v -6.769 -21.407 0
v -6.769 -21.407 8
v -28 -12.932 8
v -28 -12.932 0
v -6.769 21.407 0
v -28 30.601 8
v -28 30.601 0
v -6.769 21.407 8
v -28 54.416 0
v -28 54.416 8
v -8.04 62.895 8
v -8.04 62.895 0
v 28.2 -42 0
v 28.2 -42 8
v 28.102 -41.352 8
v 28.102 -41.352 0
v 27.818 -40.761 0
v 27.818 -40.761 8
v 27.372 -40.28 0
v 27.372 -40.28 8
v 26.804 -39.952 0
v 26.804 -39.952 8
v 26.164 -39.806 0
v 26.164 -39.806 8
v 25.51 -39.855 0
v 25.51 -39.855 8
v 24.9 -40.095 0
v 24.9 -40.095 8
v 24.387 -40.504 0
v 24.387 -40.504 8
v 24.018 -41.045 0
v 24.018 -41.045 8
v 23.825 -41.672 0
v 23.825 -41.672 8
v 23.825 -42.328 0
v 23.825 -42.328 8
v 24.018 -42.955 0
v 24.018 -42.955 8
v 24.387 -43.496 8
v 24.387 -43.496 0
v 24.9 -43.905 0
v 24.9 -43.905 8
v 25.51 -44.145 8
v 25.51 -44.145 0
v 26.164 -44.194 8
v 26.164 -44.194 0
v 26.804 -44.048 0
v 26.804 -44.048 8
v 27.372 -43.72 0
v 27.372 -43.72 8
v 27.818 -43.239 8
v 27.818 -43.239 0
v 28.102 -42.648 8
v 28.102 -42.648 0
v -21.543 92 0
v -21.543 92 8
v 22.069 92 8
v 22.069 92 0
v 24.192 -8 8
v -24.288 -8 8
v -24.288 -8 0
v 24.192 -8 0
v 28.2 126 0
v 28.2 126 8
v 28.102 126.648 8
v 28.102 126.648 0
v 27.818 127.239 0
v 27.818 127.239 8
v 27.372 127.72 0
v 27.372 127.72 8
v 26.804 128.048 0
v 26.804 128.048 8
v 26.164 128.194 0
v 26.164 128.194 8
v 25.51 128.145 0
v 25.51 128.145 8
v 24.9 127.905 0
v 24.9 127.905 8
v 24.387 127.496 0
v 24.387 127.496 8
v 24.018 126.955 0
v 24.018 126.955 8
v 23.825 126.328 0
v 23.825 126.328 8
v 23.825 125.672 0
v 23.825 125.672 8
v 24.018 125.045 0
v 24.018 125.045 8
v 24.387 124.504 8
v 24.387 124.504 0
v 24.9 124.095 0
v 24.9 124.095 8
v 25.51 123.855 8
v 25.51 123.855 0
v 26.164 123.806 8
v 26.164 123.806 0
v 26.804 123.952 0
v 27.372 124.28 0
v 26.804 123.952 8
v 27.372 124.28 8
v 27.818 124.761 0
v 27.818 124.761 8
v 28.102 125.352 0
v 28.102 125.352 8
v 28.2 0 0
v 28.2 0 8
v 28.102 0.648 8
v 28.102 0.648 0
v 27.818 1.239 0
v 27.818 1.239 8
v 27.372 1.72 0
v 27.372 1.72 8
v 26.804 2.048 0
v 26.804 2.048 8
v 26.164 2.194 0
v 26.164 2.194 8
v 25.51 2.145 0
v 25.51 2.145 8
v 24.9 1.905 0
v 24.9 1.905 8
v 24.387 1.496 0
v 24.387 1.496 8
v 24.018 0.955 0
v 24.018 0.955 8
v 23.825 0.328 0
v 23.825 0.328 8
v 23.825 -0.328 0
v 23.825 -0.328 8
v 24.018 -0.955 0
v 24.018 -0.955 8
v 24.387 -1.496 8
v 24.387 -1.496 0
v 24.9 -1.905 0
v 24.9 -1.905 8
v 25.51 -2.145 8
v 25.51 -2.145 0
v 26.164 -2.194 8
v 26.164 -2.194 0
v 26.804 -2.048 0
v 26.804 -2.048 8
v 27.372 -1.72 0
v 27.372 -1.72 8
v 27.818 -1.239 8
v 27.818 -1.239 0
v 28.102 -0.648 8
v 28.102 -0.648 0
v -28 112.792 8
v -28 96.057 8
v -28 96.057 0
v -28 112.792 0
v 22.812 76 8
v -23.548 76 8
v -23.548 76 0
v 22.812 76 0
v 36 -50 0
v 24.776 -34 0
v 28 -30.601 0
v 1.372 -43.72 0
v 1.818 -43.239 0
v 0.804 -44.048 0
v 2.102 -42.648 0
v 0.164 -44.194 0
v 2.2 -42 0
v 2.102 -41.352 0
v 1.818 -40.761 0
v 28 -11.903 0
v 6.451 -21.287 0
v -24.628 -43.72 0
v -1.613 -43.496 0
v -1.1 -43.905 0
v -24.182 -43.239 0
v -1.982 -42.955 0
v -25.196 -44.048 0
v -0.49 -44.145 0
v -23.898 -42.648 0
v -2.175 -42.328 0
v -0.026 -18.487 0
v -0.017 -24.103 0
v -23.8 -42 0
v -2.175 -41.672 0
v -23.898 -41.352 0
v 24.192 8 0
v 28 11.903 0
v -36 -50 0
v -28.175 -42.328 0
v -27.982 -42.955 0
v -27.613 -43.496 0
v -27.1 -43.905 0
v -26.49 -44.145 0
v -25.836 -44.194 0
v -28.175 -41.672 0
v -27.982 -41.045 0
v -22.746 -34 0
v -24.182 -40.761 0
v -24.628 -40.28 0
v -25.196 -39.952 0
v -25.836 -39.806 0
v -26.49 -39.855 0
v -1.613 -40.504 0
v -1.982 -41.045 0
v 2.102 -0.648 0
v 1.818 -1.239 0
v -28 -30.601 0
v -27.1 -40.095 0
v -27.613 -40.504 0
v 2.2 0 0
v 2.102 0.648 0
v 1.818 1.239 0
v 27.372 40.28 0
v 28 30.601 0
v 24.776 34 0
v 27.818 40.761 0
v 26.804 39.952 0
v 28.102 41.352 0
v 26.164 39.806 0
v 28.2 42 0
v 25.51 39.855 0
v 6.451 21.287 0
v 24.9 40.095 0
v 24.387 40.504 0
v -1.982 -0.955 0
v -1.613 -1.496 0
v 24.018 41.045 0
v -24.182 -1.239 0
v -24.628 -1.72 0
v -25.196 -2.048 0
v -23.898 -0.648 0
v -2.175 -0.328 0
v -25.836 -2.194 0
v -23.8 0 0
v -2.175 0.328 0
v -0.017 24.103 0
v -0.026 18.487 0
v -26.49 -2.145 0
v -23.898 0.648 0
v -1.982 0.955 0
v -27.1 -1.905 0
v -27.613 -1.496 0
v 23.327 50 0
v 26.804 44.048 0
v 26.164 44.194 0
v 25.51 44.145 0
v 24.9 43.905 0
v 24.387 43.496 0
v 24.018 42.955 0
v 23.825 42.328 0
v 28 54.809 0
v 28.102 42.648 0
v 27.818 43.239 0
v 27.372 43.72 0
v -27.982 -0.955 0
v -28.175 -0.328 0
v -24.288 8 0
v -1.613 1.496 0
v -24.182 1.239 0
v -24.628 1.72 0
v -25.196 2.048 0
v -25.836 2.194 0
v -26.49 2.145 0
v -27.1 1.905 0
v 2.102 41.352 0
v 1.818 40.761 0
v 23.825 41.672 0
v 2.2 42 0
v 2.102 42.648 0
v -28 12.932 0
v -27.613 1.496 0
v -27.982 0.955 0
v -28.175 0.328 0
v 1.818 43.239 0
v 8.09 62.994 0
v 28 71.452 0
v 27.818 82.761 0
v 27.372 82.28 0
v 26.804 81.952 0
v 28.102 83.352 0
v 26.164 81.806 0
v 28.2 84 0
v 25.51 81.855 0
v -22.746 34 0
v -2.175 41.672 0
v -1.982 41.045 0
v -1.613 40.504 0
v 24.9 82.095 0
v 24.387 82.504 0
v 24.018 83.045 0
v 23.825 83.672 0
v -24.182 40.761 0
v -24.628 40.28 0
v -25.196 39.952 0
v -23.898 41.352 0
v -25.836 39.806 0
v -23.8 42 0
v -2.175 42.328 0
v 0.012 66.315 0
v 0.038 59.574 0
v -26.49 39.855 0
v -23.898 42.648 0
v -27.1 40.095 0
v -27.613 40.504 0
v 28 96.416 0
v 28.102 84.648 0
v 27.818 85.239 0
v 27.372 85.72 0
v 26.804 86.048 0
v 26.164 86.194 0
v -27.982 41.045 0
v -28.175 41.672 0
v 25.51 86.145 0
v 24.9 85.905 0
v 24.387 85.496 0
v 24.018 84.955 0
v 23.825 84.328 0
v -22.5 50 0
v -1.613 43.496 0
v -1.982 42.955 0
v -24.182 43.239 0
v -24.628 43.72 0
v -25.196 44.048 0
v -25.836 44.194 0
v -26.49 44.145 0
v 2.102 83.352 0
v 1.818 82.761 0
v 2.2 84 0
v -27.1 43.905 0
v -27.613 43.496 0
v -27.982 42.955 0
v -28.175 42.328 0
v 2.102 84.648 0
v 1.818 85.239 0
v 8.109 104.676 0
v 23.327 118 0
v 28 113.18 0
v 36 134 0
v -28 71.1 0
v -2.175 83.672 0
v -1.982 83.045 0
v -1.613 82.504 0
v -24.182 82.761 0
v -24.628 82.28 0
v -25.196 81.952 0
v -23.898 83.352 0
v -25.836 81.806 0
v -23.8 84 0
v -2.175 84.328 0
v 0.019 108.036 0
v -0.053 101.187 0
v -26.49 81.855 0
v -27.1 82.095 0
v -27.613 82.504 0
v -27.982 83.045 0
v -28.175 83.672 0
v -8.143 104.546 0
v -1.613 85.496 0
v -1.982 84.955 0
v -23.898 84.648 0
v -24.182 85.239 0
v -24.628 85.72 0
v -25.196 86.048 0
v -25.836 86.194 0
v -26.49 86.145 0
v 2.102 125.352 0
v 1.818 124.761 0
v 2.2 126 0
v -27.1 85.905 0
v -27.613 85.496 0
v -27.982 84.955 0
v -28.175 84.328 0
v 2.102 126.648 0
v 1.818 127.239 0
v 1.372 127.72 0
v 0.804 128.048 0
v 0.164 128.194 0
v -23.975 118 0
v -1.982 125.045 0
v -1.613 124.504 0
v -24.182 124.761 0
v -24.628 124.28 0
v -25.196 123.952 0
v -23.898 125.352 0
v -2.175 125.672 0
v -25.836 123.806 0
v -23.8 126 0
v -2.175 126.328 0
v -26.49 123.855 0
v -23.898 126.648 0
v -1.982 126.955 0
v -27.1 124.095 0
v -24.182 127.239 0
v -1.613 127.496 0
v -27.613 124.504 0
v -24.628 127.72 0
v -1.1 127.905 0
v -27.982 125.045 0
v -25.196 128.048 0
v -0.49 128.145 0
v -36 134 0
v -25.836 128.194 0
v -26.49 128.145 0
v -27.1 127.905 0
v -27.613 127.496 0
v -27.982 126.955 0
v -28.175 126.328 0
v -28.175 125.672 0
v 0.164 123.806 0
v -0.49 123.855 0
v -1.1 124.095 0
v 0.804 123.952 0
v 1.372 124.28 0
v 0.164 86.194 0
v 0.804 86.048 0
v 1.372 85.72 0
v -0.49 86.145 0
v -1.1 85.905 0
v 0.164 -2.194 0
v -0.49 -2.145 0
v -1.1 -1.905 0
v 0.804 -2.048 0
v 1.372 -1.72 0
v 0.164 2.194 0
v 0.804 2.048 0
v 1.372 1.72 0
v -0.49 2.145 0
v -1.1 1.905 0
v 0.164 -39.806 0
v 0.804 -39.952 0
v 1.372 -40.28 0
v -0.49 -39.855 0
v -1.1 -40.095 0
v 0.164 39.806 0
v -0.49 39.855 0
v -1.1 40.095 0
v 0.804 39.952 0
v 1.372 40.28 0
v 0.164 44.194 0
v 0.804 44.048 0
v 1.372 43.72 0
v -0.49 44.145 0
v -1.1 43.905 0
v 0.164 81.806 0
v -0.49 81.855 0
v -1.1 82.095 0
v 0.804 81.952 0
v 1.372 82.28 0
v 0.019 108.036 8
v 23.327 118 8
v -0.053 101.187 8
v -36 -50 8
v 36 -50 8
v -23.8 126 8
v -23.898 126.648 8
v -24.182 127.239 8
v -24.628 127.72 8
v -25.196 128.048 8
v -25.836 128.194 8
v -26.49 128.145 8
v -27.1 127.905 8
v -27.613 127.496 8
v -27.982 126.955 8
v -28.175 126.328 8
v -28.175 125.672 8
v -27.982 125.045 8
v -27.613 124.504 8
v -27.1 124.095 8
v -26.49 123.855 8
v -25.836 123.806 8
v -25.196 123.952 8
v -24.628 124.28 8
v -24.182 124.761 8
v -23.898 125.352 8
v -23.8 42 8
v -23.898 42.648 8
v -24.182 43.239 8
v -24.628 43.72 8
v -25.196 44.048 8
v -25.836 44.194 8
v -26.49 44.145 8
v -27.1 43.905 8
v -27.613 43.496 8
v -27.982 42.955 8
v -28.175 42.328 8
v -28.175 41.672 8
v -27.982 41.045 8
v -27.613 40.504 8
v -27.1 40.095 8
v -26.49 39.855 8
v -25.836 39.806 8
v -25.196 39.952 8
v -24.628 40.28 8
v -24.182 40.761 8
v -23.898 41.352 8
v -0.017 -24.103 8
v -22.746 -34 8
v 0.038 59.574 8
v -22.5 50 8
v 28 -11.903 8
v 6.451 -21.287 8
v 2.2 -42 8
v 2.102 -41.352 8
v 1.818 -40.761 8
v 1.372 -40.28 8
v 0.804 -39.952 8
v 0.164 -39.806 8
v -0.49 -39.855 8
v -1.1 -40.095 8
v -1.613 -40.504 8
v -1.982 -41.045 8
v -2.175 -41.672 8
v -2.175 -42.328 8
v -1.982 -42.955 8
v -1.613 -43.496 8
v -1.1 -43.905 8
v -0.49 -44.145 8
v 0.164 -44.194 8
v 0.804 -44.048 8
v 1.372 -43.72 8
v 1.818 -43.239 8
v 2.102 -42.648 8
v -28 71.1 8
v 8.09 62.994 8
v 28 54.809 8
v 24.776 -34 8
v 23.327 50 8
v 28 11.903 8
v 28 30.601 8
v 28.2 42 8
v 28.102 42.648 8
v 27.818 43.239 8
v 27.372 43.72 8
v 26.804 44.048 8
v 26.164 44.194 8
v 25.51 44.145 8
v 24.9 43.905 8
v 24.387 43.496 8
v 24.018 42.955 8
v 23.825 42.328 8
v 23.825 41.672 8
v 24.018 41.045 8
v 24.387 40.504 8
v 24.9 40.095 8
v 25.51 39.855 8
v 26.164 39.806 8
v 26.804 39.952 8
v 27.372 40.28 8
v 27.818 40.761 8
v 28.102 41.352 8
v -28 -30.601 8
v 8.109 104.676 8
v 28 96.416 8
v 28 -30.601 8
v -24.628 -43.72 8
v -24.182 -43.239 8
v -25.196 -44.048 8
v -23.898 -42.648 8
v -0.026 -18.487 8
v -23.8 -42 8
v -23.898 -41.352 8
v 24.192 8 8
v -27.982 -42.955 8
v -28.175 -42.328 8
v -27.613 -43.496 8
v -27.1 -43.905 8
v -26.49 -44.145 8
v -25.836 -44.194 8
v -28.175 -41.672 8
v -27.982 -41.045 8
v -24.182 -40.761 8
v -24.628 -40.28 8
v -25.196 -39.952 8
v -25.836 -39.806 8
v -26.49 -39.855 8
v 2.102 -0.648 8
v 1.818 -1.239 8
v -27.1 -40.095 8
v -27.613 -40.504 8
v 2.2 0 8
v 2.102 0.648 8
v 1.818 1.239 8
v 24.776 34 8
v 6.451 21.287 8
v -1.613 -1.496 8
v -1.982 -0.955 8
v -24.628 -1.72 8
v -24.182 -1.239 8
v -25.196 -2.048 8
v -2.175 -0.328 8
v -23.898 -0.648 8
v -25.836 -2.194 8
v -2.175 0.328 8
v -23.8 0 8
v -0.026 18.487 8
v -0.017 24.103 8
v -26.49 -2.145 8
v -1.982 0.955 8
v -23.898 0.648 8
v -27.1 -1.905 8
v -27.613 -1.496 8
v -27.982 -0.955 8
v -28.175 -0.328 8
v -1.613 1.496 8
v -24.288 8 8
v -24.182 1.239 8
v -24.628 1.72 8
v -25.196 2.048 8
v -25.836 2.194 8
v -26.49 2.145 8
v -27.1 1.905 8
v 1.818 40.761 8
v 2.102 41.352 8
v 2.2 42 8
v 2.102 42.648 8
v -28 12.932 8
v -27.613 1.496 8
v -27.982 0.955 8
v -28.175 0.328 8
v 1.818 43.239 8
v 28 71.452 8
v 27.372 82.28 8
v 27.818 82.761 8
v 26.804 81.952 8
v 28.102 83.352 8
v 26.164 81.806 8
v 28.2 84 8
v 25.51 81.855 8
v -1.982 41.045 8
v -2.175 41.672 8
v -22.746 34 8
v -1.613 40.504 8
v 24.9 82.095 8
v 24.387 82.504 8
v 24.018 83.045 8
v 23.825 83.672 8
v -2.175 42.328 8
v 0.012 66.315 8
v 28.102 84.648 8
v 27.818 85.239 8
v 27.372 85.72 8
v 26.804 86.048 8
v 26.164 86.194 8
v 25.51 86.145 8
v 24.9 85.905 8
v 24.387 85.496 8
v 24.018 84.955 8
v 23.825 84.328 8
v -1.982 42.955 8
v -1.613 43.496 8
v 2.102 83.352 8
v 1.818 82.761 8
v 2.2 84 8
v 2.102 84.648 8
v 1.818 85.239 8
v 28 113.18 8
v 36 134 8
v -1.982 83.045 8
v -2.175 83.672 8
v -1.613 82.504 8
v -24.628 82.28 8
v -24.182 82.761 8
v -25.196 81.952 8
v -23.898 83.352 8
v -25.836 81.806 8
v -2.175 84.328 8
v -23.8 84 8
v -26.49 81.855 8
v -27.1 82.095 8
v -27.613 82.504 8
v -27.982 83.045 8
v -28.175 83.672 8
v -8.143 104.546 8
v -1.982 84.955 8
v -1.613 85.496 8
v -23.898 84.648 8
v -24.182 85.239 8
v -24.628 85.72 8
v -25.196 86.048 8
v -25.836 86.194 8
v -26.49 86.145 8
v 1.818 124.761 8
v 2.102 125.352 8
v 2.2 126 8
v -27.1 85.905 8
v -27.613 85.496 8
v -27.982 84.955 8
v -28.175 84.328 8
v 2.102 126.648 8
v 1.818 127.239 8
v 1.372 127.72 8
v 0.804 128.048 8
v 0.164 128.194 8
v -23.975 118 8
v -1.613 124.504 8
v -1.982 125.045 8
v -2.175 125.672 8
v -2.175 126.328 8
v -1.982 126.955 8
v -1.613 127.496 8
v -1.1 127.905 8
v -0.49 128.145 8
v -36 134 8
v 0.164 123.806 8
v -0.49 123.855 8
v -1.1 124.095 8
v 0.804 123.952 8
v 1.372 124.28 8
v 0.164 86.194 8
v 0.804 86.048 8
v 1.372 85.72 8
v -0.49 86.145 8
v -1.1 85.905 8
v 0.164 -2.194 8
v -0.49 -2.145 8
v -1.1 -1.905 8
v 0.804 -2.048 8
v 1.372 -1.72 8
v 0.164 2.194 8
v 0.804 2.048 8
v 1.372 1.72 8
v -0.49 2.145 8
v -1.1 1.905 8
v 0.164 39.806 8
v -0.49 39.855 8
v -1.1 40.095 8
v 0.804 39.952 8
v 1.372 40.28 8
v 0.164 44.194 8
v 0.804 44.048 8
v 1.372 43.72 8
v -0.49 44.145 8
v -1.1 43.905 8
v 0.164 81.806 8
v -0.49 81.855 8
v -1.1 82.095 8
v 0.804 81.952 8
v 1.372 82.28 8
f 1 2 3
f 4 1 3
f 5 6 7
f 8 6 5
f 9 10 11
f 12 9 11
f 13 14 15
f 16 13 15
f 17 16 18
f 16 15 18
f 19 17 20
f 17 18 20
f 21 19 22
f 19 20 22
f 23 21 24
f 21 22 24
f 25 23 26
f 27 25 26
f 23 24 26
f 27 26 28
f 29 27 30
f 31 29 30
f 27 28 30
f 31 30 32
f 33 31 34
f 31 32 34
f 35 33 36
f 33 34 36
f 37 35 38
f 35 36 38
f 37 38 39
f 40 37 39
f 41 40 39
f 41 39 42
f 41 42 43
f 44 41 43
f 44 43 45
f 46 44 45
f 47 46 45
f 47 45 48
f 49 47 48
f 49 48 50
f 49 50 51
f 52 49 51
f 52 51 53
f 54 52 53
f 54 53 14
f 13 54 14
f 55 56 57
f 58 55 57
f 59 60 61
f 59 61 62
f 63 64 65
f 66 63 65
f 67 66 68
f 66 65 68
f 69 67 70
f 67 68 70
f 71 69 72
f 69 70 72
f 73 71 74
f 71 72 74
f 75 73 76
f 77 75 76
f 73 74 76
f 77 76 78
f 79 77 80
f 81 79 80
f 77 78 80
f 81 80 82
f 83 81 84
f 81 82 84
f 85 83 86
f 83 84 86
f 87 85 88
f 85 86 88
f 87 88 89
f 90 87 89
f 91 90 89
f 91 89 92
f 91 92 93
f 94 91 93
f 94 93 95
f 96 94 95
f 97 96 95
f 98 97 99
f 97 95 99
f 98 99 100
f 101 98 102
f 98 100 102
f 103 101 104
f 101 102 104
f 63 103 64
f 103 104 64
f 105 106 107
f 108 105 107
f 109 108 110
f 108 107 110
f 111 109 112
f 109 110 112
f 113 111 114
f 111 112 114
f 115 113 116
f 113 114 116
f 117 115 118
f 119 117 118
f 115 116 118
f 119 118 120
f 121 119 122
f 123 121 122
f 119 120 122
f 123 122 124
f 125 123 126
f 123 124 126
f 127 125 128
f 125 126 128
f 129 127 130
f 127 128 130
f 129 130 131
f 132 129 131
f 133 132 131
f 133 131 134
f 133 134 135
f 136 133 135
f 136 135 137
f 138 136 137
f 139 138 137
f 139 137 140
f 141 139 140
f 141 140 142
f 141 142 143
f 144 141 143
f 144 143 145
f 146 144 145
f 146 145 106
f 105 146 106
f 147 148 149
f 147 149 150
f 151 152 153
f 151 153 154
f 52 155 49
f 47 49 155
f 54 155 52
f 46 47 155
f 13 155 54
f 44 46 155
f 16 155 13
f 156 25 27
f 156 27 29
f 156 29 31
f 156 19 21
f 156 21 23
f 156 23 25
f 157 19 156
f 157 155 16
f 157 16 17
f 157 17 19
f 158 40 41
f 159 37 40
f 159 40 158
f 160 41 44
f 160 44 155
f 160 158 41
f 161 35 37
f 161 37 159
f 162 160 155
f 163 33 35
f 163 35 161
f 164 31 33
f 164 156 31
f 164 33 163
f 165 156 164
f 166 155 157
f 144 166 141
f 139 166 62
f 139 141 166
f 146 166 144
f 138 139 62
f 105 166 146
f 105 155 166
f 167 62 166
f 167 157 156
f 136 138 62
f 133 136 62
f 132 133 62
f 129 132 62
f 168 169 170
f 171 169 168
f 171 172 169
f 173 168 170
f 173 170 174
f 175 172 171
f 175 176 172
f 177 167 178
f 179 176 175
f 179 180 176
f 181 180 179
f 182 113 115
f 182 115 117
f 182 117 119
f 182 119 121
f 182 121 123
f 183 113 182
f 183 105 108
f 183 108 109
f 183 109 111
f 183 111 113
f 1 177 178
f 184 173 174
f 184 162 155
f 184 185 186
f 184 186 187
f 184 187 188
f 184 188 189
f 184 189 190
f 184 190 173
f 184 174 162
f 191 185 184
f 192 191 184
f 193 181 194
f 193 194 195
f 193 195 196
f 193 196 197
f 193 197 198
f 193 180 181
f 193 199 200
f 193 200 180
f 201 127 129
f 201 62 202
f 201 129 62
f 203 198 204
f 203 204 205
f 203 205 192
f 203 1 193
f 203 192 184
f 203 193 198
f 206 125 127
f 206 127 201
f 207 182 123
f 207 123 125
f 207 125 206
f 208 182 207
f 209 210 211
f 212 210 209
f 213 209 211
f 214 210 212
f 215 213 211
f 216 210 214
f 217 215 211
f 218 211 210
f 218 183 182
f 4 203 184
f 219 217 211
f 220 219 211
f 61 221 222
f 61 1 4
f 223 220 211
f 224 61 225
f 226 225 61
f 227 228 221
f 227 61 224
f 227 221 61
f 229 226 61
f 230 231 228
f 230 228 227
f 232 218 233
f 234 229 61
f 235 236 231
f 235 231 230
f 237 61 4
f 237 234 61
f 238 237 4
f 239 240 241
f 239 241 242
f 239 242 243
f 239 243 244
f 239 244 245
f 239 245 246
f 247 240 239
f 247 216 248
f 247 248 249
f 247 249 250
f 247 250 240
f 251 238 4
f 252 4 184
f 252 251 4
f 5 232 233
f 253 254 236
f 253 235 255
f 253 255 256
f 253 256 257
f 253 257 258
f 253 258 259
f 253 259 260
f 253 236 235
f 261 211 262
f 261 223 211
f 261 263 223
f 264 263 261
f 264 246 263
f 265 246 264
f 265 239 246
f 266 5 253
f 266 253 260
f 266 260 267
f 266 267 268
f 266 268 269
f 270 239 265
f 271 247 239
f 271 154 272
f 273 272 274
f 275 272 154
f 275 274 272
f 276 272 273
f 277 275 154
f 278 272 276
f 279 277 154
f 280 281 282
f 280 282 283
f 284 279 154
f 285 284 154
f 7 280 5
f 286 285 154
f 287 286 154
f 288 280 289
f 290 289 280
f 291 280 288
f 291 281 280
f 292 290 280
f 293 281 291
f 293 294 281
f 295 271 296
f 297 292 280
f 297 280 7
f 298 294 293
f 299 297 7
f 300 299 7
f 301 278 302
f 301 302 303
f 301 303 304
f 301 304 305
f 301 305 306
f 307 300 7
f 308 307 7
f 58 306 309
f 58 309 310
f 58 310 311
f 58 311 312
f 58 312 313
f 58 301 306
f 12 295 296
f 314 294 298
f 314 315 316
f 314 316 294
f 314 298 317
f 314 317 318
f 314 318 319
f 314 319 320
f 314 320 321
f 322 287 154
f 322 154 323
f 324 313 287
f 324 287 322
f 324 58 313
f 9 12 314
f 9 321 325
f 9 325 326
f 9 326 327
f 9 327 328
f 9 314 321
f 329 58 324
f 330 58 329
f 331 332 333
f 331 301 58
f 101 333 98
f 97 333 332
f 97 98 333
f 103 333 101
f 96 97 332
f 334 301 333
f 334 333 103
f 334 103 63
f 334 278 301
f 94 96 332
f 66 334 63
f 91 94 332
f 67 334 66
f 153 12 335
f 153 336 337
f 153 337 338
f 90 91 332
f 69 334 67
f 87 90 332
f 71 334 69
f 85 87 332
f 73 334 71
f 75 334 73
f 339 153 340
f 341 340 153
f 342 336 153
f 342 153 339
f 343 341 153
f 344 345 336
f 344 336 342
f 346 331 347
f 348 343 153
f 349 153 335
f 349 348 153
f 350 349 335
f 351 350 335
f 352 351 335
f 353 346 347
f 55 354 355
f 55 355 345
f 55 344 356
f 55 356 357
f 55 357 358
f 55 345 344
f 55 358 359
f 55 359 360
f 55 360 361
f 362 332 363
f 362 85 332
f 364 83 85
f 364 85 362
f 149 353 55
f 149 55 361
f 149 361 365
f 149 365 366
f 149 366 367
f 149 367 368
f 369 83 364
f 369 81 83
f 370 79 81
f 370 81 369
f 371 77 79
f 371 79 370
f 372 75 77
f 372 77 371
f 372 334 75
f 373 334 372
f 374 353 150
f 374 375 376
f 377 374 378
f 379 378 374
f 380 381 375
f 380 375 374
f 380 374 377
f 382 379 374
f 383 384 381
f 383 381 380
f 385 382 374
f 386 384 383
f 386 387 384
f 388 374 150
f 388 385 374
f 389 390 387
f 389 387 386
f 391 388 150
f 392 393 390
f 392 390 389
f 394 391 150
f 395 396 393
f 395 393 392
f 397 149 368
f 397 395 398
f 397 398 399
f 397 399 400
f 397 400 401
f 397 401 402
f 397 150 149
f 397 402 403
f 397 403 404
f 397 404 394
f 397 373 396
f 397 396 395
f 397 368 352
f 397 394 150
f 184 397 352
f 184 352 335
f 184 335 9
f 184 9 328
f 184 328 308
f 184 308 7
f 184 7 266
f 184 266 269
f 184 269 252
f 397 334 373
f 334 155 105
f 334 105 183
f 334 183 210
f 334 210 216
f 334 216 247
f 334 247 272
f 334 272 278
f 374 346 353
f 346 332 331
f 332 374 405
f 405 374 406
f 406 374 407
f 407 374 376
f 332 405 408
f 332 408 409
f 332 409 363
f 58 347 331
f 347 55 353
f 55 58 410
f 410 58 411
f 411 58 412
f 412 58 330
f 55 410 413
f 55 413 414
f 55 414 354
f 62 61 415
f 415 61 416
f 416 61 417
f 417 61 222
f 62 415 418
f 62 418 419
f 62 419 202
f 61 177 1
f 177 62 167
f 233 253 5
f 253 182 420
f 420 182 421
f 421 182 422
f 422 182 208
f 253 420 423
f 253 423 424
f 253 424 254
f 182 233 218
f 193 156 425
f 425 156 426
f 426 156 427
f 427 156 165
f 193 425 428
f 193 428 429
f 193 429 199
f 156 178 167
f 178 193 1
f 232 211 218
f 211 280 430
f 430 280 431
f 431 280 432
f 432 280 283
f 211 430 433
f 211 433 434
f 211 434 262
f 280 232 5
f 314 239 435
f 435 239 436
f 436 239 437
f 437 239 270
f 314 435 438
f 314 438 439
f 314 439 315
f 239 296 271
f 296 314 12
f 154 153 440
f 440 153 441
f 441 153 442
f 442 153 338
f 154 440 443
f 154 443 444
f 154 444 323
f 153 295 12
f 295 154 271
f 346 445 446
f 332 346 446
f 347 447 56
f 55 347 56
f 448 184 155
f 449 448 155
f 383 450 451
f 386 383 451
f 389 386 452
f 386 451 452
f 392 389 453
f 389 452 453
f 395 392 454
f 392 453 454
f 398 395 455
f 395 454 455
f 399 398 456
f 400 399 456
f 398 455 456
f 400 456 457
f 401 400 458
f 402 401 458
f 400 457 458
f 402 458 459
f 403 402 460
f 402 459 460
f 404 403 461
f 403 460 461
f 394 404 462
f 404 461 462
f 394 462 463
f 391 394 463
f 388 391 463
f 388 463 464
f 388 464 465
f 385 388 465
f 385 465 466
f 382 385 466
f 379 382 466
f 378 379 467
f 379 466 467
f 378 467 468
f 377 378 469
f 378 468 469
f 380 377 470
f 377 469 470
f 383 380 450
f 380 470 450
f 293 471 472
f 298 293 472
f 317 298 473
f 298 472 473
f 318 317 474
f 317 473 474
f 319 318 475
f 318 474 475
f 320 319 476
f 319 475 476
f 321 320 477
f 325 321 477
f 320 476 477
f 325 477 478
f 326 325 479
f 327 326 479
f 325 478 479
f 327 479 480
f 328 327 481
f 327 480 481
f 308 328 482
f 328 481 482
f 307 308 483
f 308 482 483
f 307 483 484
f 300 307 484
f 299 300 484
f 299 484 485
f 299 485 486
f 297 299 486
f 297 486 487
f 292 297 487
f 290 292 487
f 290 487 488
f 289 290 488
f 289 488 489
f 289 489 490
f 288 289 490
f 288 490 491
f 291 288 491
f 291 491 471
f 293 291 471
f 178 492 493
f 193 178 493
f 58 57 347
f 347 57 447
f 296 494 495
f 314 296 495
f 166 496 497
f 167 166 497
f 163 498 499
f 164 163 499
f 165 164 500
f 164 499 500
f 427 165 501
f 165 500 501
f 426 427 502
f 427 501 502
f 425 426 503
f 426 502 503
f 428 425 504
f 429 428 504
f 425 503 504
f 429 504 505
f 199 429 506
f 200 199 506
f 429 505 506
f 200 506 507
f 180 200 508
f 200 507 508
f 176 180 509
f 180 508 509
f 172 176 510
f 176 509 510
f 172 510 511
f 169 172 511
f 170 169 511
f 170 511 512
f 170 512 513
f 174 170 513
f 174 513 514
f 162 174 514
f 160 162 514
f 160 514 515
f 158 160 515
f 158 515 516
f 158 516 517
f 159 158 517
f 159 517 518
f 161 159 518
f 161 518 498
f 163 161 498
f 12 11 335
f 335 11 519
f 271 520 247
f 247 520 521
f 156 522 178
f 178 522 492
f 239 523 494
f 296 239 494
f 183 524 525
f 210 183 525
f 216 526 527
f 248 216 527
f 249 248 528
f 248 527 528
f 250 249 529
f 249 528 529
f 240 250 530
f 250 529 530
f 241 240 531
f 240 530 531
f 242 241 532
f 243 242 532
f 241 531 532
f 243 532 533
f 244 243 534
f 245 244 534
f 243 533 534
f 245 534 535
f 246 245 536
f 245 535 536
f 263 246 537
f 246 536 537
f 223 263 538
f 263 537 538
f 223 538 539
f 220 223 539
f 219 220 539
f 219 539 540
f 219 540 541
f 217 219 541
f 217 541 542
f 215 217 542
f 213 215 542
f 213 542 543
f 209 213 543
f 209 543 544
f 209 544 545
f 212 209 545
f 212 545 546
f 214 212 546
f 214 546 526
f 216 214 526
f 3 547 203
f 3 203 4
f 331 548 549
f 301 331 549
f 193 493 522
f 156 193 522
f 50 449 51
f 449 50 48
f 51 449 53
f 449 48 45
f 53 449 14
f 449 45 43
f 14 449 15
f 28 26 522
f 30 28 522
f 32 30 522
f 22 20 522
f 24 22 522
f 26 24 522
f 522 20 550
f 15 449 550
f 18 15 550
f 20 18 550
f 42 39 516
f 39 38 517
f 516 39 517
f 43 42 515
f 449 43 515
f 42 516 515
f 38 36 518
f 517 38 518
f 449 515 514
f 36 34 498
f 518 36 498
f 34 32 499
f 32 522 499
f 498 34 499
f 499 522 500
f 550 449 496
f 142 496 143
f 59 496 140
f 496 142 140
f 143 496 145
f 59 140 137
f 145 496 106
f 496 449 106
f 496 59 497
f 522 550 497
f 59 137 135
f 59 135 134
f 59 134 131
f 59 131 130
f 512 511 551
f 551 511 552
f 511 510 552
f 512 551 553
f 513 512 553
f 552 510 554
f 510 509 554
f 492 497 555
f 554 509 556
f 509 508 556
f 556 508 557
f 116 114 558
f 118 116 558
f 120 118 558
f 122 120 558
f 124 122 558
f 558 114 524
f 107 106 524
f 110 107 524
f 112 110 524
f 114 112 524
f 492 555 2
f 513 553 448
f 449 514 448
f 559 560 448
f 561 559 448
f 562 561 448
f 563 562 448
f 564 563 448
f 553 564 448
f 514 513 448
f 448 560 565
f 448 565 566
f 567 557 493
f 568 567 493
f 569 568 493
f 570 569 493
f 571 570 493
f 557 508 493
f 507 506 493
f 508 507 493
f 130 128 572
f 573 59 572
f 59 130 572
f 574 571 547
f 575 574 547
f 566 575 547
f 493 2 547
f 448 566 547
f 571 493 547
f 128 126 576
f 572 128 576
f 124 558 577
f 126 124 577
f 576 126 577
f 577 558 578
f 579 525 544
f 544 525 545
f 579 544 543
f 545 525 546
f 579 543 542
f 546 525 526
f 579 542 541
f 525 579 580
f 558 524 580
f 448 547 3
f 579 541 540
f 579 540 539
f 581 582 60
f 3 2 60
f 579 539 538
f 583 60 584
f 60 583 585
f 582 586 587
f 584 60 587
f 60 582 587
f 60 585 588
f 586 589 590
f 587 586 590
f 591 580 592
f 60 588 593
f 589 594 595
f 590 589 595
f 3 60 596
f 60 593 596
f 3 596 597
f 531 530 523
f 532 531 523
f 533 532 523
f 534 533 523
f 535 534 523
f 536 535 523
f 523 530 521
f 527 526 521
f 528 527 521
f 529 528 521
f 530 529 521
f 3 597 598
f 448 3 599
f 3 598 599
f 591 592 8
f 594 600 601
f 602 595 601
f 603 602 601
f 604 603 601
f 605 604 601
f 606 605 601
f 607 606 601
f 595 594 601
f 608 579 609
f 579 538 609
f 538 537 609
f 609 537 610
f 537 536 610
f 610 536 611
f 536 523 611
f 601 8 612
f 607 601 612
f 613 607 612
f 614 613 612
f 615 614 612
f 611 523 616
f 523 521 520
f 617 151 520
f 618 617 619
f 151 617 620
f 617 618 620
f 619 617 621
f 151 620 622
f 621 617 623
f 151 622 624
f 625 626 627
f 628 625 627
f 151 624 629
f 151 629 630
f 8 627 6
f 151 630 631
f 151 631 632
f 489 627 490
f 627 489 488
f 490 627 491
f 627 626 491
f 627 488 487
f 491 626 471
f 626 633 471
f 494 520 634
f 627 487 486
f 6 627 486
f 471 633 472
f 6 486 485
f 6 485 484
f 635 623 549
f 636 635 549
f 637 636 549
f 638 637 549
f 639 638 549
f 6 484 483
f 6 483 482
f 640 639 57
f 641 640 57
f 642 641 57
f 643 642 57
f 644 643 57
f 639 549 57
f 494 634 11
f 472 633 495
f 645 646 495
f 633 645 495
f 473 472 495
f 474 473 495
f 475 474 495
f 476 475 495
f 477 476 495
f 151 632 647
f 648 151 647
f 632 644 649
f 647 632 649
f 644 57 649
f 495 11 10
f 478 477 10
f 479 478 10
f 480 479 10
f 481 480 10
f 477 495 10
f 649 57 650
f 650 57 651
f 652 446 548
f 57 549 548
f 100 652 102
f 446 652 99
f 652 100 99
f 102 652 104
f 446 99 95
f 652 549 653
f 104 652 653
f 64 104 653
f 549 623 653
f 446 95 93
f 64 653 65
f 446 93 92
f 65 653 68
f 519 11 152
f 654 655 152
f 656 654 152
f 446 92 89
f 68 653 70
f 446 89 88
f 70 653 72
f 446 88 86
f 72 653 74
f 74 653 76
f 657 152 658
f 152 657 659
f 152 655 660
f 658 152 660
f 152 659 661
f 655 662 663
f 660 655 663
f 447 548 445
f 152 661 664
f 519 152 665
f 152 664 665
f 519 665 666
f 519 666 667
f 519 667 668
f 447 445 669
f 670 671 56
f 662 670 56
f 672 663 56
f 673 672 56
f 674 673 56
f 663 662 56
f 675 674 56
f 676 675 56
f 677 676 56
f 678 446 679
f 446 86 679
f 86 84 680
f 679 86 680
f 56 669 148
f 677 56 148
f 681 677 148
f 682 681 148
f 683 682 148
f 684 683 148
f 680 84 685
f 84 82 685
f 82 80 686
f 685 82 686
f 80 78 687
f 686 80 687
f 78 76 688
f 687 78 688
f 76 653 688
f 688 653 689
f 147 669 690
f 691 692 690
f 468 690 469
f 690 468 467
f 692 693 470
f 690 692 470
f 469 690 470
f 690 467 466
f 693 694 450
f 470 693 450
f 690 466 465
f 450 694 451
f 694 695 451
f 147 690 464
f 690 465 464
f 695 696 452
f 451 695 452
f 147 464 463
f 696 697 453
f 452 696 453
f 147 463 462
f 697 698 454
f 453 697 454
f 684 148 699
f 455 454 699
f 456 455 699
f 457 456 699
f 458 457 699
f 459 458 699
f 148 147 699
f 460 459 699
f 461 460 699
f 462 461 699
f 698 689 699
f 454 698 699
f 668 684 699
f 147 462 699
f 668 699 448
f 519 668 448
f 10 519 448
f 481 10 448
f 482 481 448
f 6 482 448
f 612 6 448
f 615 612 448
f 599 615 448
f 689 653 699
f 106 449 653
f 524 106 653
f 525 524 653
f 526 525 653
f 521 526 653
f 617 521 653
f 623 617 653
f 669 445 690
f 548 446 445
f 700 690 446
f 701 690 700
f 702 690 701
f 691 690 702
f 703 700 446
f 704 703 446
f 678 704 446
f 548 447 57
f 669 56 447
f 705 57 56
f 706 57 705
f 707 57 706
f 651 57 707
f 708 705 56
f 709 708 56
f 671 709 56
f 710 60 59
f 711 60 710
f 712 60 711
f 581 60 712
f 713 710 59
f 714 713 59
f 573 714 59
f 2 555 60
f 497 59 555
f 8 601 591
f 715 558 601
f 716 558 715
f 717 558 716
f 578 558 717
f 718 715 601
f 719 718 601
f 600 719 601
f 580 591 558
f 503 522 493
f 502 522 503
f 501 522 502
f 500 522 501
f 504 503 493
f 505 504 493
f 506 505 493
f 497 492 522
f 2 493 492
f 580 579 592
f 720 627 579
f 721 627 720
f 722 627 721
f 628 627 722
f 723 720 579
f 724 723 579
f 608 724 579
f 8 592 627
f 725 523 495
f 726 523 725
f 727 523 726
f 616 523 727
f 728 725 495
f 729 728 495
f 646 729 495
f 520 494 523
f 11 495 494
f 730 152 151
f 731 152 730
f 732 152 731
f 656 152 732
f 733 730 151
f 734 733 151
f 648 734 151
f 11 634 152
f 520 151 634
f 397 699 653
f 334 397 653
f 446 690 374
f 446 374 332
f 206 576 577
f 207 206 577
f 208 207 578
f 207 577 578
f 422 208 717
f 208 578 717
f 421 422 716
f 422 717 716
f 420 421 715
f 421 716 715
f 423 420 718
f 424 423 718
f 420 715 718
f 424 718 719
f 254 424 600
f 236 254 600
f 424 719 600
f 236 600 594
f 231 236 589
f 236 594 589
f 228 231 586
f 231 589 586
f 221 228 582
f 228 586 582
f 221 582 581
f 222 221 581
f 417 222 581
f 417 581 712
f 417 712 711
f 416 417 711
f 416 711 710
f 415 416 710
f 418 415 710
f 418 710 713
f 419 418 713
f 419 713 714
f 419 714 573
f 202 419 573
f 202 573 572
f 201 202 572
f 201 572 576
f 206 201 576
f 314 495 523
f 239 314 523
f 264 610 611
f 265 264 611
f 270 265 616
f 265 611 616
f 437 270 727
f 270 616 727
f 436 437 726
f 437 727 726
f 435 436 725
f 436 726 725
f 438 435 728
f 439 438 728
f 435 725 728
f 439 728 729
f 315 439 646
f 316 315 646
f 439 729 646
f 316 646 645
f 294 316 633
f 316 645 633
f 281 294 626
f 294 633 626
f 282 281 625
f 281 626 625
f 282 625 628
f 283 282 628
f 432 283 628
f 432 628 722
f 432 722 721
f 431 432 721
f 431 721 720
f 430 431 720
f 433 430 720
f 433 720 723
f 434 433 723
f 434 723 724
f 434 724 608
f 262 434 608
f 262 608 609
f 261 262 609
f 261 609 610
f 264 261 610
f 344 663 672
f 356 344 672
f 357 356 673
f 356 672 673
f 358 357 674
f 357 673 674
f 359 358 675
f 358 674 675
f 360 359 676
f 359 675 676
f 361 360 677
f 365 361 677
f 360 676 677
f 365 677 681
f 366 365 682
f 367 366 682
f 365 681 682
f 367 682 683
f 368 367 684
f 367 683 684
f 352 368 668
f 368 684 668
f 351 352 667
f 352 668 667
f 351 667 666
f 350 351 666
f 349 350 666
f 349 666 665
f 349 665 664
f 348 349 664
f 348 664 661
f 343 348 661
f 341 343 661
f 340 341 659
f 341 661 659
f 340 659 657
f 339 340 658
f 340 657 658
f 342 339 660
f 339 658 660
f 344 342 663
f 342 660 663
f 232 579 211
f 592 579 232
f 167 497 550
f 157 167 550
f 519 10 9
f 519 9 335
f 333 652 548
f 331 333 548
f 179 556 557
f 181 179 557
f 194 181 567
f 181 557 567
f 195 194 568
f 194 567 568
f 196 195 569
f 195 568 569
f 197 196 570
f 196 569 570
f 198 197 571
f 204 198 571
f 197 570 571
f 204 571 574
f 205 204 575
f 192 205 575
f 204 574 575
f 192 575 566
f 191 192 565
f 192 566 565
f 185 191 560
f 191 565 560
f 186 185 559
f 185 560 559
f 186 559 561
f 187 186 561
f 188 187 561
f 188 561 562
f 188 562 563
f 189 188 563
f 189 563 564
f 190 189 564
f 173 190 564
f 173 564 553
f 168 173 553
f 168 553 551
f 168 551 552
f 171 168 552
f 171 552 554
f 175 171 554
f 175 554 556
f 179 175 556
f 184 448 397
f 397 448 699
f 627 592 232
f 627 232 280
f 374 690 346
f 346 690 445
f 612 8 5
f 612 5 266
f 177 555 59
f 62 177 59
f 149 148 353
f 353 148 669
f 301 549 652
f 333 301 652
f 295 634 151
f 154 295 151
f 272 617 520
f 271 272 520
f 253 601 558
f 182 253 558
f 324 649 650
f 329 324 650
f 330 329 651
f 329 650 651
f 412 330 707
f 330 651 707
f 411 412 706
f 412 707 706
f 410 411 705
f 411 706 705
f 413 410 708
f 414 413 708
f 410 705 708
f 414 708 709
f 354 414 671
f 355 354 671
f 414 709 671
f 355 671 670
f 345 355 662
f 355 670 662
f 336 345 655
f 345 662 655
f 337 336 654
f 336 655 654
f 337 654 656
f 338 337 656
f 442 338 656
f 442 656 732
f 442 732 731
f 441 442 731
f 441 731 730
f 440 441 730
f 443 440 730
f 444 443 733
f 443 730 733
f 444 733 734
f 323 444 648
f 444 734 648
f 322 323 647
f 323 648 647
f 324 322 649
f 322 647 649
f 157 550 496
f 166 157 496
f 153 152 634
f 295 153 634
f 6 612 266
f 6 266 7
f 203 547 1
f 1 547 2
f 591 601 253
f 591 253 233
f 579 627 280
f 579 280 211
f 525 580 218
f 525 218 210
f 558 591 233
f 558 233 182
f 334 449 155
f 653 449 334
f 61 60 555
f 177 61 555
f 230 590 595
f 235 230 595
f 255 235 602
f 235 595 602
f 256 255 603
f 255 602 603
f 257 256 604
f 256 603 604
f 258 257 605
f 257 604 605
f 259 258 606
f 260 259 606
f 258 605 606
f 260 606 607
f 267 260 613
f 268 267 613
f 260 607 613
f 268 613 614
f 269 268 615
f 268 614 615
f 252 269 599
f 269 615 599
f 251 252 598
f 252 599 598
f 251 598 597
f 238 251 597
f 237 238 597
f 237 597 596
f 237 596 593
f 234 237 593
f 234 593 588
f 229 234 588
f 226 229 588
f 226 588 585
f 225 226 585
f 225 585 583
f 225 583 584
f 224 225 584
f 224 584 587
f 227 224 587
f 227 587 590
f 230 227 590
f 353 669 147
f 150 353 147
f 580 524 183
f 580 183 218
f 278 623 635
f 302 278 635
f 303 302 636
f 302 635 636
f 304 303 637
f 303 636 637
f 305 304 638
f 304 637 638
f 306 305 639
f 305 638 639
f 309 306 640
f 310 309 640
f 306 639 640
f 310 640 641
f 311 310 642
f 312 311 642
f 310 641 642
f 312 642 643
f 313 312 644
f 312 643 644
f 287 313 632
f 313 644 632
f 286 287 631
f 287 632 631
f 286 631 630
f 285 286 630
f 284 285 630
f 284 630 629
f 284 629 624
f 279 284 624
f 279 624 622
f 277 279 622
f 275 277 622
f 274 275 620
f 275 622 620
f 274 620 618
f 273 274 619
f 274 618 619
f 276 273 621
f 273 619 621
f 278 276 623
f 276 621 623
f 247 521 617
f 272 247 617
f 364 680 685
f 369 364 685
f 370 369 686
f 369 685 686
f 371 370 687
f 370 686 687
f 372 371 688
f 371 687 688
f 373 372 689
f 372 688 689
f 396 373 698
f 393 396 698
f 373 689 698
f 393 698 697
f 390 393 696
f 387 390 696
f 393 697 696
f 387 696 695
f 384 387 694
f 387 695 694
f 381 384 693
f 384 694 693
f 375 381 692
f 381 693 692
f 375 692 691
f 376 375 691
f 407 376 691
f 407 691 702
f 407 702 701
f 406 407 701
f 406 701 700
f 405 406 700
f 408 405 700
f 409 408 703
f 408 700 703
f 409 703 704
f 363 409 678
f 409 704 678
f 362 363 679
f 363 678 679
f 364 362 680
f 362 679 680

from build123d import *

# Parameters (mm, degrees)
SKETCH_1_W          = 72
SKETCH_1_H          = 100
EXTRUDE_1_DEPTH     = 8
CUT_EXTRUDE_1_REACH = 64.129
SKETCH_2_R          = 2.2
SKETCH_2_W          = 56
SKETCH_2_H          = 26
EXTRUDE_2_DEPTH     = 8
SKETCH_4_W          = 72
SKETCH_4_H          = 84
EXTRUDE_3_DEPTH     = 8
SKETCH_5_R          = 2.2
SKETCH_5_W          = 56
SKETCH_5_H          = 26
CUT_EXTRUDE_2_DEPTH = 8
EXTRUDE_4_DEPTH     = 8


with BuildPart() as part:
    # 草图1 → 凸台-拉伸1 (new body)
    with BuildSketch(Plane.XY):
        Rectangle(SKETCH_1_W, SKETCH_1_H)
    extrude(amount=EXTRUDE_1_DEPTH)

    # 草图2 → 切除-拉伸1 (cut, up to next)
    with BuildSketch(Plane.XY.offset(8), mode=Mode.PRIVATE) as cut_extrude_1_sk1:
        with Locations((-26, -42)):
            Circle(SKETCH_2_R)
    cut_extrude_1_tool1 = extrude(cut_extrude_1_sk1.sketch, amount=-CUT_EXTRUDE_1_REACH, mode=Mode.PRIVATE) & part.part
    # 草图2 → 切除-拉伸1 (cut, up to next)
    with BuildSketch(Plane.XY.offset(8), mode=Mode.PRIVATE) as cut_extrude_1_sk2:
        with Locations((0, -42)):
            Circle(SKETCH_2_R)
    cut_extrude_1_tool2 = extrude(cut_extrude_1_sk2.sketch, amount=-CUT_EXTRUDE_1_REACH, mode=Mode.PRIVATE) & part.part
    # 草图2 → 切除-拉伸1 (cut, up to next)
    with BuildSketch(Plane.XY.offset(8), mode=Mode.PRIVATE) as cut_extrude_1_sk3:
        with Locations((26, -42)):
            Circle(SKETCH_2_R)
    cut_extrude_1_tool3 = extrude(cut_extrude_1_sk3.sketch, amount=-CUT_EXTRUDE_1_REACH, mode=Mode.PRIVATE) & part.part
    # 草图2 → 切除-拉伸1 (cut, up to next)
    with BuildSketch(Plane.XY.offset(8), mode=Mode.PRIVATE) as cut_extrude_1_sk4:
        with Locations((26, 42)):
            Circle(SKETCH_2_R)
    cut_extrude_1_tool4 = extrude(cut_extrude_1_sk4.sketch, amount=-CUT_EXTRUDE_1_REACH, mode=Mode.PRIVATE) & part.part
    # 草图2 → 切除-拉伸1 (cut, up to next)
    with BuildSketch(Plane.XY.offset(8), mode=Mode.PRIVATE) as cut_extrude_1_sk5:
        with Locations((0, 42)):
            Circle(SKETCH_2_R)
    cut_extrude_1_tool5 = extrude(cut_extrude_1_sk5.sketch, amount=-CUT_EXTRUDE_1_REACH, mode=Mode.PRIVATE) & part.part
    # 草图2 → 切除-拉伸1 (cut, up to next)
    with BuildSketch(Plane.XY.offset(8), mode=Mode.PRIVATE) as cut_extrude_1_sk6:
        with Locations((-26, 42)):
            Circle(SKETCH_2_R)
    cut_extrude_1_tool6 = extrude(cut_extrude_1_sk6.sketch, amount=-CUT_EXTRUDE_1_REACH, mode=Mode.PRIVATE) & part.part
    # 草图2 → 切除-拉伸1 (cut, up to next)
    with BuildSketch(Plane.XY.offset(8), mode=Mode.PRIVATE) as cut_extrude_1_sk7:
        with Locations((-26, 0)):
            Circle(SKETCH_2_R)
    cut_extrude_1_tool7 = extrude(cut_extrude_1_sk7.sketch, amount=-CUT_EXTRUDE_1_REACH, mode=Mode.PRIVATE) & part.part
    # 草图2 → 切除-拉伸1 (cut, up to next)
    with BuildSketch(Plane.XY.offset(8), mode=Mode.PRIVATE) as cut_extrude_1_sk8:
        Circle(SKETCH_2_R)
    cut_extrude_1_tool8 = extrude(cut_extrude_1_sk8.sketch, amount=-CUT_EXTRUDE_1_REACH, mode=Mode.PRIVATE) & part.part
    # 草图2 → 切除-拉伸1 (cut, up to next)
    with BuildSketch(Plane.XY.offset(8), mode=Mode.PRIVATE) as cut_extrude_1_sk9:
        with Locations((26, 0)):
            Circle(SKETCH_2_R)
    cut_extrude_1_tool9 = extrude(cut_extrude_1_sk9.sketch, amount=-CUT_EXTRUDE_1_REACH, mode=Mode.PRIVATE) & part.part
    # 草图2 → 切除-拉伸1 (cut, up to next)
    with BuildSketch(Plane.XY.offset(8), mode=Mode.PRIVATE) as cut_extrude_1_sk10:
        with Locations((0, 21)):
            Rectangle(SKETCH_2_W, SKETCH_2_H)
    cut_extrude_1_tool10 = extrude(cut_extrude_1_sk10.sketch, amount=-CUT_EXTRUDE_1_REACH, mode=Mode.PRIVATE) & part.part
    # 草图2 → 切除-拉伸1 (cut, up to next)
    with BuildSketch(Plane.XY.offset(8), mode=Mode.PRIVATE) as cut_extrude_1_sk11:
        with Locations((0, -21)):
            Rectangle(SKETCH_2_W, SKETCH_2_H)
    cut_extrude_1_tool11 = extrude(cut_extrude_1_sk11.sketch, amount=-CUT_EXTRUDE_1_REACH, mode=Mode.PRIVATE) & part.part
    add(cut_extrude_1_tool1.solids().sort_by_distance((-26, -42, 8))[0], mode=Mode.SUBTRACT)
    add(cut_extrude_1_tool2.solids().sort_by_distance((0, -42, 8))[0], mode=Mode.SUBTRACT)
    add(cut_extrude_1_tool3.solids().sort_by_distance((26, -42, 8))[0], mode=Mode.SUBTRACT)
    add(cut_extrude_1_tool4.solids().sort_by_distance((26, 42, 8))[0], mode=Mode.SUBTRACT)
    add(cut_extrude_1_tool5.solids().sort_by_distance((0, 42, 8))[0], mode=Mode.SUBTRACT)
    add(cut_extrude_1_tool6.solids().sort_by_distance((-26, 42, 8))[0], mode=Mode.SUBTRACT)
    add(cut_extrude_1_tool7.solids().sort_by_distance((-26, 0, 8))[0], mode=Mode.SUBTRACT)
    add(cut_extrude_1_tool8.solids().sort_by_distance((0, 0, 8))[0], mode=Mode.SUBTRACT)
    add(cut_extrude_1_tool9.solids().sort_by_distance((26, 0, 8))[0], mode=Mode.SUBTRACT)
    add(cut_extrude_1_tool10.solids().sort_by_distance((0, 21, 8))[0], mode=Mode.SUBTRACT)
    add(cut_extrude_1_tool11.solids().sort_by_distance((0, -21, 8))[0], mode=Mode.SUBTRACT)

    # 草图3 → 凸台-拉伸2 (add)
    with BuildSketch(Plane.XY.offset(8)):
        Polygon((-28, 30.60122868), (-6.768682564, 21.407188314), (-28, 12.93157869), (-28, 8), (-24.288219299, 8), (-0.025829724, 18.487253581), (24.191837476, 8), (28, 8), (28, 11.903155093), (6.450556004, 21.286627452), (28, 30.60122868), (28, 34), (24.776184912, 34), (-0.016552798, 24.102660047), (-22.746110137, 34), (-28, 34), align=None)
        Polygon((-28, -8), (-24.288219299, -8), (-0.025829724, -18.487253581), (24.191837476, -8), (28, -8), (28, -11.903155093), (6.450556004, -21.286627452), (28, -30.60122868), (28, -34), (24.776184912, -34), (-0.016552798, -24.102660047), (-22.746110137, -34), (-28, -34), (-28, -30.60122868), (-6.768682564, -21.407188314), (-28, -12.93157869), align=None)
    extrude(amount=-EXTRUDE_2_DEPTH)

    # 草图4 → 凸台-拉伸3 (add)
    with BuildSketch(Plane.XY.offset(8)):
        with Locations((0, 92)):
            Rectangle(SKETCH_4_W, SKETCH_4_H)
    extrude(amount=-EXTRUDE_3_DEPTH)

    # 草图5 → 切除-拉伸2 (cut)
    with BuildSketch(Plane.XY.offset(8)):
        with Locations((0, 84)):
            Circle(SKETCH_5_R)
        with Locations((0, 126)):
            Circle(SKETCH_5_R)
        with Locations((26, 126)):
            Circle(SKETCH_5_R)
        with Locations((-26, 126)):
            Circle(SKETCH_5_R)
        with Locations((-26, 84)):
            Circle(SKETCH_5_R)
        with Locations((26, 84)):
            Circle(SKETCH_5_R)
        with Locations((0, 105)):
            Rectangle(SKETCH_5_W, SKETCH_5_H)
        with Locations((0, 63)):
            Rectangle(SKETCH_5_W, SKETCH_5_H)
    extrude(amount=-CUT_EXTRUDE_2_DEPTH, mode=Mode.SUBTRACT)

    # 草图6 → 凸台-拉伸4 (add)
    with BuildSketch(Plane.XY.offset(8)):
        Polygon((-23.974932243, 118), (0.019492881, 108.0358887), (23.327208426, 118), (28, 118), (28, 113.17961686), (8.109494179, 104.676371941), (28, 96.416486039), (28, 92), (22.06939562, 92), (-0.053196802, 101.186799516), (-21.542650648, 92), (-28, 92), (-28, 96.057479873), (-8.1431981, 104.546316276), (-28, 112.792206026), (-28, 118), align=None)
        Polygon((-23.547674388, 76), (0.012222409, 66.314841093), (22.812282036, 76), (28, 76), (28, 71.451887213), (8.089746155, 62.994278964), (28, 54.80943953), (28, 50), (23.327208426, 50), (0.037852996, 59.573942964), (-22.500390573, 50), (-28, 50), (-28, 54.415625486), (-8.03967075, 62.894505093), (-28, 71.099929858), (-28, 76), align=None)
    extrude(amount=-EXTRUDE_4_DEPTH)


solid = part.part
